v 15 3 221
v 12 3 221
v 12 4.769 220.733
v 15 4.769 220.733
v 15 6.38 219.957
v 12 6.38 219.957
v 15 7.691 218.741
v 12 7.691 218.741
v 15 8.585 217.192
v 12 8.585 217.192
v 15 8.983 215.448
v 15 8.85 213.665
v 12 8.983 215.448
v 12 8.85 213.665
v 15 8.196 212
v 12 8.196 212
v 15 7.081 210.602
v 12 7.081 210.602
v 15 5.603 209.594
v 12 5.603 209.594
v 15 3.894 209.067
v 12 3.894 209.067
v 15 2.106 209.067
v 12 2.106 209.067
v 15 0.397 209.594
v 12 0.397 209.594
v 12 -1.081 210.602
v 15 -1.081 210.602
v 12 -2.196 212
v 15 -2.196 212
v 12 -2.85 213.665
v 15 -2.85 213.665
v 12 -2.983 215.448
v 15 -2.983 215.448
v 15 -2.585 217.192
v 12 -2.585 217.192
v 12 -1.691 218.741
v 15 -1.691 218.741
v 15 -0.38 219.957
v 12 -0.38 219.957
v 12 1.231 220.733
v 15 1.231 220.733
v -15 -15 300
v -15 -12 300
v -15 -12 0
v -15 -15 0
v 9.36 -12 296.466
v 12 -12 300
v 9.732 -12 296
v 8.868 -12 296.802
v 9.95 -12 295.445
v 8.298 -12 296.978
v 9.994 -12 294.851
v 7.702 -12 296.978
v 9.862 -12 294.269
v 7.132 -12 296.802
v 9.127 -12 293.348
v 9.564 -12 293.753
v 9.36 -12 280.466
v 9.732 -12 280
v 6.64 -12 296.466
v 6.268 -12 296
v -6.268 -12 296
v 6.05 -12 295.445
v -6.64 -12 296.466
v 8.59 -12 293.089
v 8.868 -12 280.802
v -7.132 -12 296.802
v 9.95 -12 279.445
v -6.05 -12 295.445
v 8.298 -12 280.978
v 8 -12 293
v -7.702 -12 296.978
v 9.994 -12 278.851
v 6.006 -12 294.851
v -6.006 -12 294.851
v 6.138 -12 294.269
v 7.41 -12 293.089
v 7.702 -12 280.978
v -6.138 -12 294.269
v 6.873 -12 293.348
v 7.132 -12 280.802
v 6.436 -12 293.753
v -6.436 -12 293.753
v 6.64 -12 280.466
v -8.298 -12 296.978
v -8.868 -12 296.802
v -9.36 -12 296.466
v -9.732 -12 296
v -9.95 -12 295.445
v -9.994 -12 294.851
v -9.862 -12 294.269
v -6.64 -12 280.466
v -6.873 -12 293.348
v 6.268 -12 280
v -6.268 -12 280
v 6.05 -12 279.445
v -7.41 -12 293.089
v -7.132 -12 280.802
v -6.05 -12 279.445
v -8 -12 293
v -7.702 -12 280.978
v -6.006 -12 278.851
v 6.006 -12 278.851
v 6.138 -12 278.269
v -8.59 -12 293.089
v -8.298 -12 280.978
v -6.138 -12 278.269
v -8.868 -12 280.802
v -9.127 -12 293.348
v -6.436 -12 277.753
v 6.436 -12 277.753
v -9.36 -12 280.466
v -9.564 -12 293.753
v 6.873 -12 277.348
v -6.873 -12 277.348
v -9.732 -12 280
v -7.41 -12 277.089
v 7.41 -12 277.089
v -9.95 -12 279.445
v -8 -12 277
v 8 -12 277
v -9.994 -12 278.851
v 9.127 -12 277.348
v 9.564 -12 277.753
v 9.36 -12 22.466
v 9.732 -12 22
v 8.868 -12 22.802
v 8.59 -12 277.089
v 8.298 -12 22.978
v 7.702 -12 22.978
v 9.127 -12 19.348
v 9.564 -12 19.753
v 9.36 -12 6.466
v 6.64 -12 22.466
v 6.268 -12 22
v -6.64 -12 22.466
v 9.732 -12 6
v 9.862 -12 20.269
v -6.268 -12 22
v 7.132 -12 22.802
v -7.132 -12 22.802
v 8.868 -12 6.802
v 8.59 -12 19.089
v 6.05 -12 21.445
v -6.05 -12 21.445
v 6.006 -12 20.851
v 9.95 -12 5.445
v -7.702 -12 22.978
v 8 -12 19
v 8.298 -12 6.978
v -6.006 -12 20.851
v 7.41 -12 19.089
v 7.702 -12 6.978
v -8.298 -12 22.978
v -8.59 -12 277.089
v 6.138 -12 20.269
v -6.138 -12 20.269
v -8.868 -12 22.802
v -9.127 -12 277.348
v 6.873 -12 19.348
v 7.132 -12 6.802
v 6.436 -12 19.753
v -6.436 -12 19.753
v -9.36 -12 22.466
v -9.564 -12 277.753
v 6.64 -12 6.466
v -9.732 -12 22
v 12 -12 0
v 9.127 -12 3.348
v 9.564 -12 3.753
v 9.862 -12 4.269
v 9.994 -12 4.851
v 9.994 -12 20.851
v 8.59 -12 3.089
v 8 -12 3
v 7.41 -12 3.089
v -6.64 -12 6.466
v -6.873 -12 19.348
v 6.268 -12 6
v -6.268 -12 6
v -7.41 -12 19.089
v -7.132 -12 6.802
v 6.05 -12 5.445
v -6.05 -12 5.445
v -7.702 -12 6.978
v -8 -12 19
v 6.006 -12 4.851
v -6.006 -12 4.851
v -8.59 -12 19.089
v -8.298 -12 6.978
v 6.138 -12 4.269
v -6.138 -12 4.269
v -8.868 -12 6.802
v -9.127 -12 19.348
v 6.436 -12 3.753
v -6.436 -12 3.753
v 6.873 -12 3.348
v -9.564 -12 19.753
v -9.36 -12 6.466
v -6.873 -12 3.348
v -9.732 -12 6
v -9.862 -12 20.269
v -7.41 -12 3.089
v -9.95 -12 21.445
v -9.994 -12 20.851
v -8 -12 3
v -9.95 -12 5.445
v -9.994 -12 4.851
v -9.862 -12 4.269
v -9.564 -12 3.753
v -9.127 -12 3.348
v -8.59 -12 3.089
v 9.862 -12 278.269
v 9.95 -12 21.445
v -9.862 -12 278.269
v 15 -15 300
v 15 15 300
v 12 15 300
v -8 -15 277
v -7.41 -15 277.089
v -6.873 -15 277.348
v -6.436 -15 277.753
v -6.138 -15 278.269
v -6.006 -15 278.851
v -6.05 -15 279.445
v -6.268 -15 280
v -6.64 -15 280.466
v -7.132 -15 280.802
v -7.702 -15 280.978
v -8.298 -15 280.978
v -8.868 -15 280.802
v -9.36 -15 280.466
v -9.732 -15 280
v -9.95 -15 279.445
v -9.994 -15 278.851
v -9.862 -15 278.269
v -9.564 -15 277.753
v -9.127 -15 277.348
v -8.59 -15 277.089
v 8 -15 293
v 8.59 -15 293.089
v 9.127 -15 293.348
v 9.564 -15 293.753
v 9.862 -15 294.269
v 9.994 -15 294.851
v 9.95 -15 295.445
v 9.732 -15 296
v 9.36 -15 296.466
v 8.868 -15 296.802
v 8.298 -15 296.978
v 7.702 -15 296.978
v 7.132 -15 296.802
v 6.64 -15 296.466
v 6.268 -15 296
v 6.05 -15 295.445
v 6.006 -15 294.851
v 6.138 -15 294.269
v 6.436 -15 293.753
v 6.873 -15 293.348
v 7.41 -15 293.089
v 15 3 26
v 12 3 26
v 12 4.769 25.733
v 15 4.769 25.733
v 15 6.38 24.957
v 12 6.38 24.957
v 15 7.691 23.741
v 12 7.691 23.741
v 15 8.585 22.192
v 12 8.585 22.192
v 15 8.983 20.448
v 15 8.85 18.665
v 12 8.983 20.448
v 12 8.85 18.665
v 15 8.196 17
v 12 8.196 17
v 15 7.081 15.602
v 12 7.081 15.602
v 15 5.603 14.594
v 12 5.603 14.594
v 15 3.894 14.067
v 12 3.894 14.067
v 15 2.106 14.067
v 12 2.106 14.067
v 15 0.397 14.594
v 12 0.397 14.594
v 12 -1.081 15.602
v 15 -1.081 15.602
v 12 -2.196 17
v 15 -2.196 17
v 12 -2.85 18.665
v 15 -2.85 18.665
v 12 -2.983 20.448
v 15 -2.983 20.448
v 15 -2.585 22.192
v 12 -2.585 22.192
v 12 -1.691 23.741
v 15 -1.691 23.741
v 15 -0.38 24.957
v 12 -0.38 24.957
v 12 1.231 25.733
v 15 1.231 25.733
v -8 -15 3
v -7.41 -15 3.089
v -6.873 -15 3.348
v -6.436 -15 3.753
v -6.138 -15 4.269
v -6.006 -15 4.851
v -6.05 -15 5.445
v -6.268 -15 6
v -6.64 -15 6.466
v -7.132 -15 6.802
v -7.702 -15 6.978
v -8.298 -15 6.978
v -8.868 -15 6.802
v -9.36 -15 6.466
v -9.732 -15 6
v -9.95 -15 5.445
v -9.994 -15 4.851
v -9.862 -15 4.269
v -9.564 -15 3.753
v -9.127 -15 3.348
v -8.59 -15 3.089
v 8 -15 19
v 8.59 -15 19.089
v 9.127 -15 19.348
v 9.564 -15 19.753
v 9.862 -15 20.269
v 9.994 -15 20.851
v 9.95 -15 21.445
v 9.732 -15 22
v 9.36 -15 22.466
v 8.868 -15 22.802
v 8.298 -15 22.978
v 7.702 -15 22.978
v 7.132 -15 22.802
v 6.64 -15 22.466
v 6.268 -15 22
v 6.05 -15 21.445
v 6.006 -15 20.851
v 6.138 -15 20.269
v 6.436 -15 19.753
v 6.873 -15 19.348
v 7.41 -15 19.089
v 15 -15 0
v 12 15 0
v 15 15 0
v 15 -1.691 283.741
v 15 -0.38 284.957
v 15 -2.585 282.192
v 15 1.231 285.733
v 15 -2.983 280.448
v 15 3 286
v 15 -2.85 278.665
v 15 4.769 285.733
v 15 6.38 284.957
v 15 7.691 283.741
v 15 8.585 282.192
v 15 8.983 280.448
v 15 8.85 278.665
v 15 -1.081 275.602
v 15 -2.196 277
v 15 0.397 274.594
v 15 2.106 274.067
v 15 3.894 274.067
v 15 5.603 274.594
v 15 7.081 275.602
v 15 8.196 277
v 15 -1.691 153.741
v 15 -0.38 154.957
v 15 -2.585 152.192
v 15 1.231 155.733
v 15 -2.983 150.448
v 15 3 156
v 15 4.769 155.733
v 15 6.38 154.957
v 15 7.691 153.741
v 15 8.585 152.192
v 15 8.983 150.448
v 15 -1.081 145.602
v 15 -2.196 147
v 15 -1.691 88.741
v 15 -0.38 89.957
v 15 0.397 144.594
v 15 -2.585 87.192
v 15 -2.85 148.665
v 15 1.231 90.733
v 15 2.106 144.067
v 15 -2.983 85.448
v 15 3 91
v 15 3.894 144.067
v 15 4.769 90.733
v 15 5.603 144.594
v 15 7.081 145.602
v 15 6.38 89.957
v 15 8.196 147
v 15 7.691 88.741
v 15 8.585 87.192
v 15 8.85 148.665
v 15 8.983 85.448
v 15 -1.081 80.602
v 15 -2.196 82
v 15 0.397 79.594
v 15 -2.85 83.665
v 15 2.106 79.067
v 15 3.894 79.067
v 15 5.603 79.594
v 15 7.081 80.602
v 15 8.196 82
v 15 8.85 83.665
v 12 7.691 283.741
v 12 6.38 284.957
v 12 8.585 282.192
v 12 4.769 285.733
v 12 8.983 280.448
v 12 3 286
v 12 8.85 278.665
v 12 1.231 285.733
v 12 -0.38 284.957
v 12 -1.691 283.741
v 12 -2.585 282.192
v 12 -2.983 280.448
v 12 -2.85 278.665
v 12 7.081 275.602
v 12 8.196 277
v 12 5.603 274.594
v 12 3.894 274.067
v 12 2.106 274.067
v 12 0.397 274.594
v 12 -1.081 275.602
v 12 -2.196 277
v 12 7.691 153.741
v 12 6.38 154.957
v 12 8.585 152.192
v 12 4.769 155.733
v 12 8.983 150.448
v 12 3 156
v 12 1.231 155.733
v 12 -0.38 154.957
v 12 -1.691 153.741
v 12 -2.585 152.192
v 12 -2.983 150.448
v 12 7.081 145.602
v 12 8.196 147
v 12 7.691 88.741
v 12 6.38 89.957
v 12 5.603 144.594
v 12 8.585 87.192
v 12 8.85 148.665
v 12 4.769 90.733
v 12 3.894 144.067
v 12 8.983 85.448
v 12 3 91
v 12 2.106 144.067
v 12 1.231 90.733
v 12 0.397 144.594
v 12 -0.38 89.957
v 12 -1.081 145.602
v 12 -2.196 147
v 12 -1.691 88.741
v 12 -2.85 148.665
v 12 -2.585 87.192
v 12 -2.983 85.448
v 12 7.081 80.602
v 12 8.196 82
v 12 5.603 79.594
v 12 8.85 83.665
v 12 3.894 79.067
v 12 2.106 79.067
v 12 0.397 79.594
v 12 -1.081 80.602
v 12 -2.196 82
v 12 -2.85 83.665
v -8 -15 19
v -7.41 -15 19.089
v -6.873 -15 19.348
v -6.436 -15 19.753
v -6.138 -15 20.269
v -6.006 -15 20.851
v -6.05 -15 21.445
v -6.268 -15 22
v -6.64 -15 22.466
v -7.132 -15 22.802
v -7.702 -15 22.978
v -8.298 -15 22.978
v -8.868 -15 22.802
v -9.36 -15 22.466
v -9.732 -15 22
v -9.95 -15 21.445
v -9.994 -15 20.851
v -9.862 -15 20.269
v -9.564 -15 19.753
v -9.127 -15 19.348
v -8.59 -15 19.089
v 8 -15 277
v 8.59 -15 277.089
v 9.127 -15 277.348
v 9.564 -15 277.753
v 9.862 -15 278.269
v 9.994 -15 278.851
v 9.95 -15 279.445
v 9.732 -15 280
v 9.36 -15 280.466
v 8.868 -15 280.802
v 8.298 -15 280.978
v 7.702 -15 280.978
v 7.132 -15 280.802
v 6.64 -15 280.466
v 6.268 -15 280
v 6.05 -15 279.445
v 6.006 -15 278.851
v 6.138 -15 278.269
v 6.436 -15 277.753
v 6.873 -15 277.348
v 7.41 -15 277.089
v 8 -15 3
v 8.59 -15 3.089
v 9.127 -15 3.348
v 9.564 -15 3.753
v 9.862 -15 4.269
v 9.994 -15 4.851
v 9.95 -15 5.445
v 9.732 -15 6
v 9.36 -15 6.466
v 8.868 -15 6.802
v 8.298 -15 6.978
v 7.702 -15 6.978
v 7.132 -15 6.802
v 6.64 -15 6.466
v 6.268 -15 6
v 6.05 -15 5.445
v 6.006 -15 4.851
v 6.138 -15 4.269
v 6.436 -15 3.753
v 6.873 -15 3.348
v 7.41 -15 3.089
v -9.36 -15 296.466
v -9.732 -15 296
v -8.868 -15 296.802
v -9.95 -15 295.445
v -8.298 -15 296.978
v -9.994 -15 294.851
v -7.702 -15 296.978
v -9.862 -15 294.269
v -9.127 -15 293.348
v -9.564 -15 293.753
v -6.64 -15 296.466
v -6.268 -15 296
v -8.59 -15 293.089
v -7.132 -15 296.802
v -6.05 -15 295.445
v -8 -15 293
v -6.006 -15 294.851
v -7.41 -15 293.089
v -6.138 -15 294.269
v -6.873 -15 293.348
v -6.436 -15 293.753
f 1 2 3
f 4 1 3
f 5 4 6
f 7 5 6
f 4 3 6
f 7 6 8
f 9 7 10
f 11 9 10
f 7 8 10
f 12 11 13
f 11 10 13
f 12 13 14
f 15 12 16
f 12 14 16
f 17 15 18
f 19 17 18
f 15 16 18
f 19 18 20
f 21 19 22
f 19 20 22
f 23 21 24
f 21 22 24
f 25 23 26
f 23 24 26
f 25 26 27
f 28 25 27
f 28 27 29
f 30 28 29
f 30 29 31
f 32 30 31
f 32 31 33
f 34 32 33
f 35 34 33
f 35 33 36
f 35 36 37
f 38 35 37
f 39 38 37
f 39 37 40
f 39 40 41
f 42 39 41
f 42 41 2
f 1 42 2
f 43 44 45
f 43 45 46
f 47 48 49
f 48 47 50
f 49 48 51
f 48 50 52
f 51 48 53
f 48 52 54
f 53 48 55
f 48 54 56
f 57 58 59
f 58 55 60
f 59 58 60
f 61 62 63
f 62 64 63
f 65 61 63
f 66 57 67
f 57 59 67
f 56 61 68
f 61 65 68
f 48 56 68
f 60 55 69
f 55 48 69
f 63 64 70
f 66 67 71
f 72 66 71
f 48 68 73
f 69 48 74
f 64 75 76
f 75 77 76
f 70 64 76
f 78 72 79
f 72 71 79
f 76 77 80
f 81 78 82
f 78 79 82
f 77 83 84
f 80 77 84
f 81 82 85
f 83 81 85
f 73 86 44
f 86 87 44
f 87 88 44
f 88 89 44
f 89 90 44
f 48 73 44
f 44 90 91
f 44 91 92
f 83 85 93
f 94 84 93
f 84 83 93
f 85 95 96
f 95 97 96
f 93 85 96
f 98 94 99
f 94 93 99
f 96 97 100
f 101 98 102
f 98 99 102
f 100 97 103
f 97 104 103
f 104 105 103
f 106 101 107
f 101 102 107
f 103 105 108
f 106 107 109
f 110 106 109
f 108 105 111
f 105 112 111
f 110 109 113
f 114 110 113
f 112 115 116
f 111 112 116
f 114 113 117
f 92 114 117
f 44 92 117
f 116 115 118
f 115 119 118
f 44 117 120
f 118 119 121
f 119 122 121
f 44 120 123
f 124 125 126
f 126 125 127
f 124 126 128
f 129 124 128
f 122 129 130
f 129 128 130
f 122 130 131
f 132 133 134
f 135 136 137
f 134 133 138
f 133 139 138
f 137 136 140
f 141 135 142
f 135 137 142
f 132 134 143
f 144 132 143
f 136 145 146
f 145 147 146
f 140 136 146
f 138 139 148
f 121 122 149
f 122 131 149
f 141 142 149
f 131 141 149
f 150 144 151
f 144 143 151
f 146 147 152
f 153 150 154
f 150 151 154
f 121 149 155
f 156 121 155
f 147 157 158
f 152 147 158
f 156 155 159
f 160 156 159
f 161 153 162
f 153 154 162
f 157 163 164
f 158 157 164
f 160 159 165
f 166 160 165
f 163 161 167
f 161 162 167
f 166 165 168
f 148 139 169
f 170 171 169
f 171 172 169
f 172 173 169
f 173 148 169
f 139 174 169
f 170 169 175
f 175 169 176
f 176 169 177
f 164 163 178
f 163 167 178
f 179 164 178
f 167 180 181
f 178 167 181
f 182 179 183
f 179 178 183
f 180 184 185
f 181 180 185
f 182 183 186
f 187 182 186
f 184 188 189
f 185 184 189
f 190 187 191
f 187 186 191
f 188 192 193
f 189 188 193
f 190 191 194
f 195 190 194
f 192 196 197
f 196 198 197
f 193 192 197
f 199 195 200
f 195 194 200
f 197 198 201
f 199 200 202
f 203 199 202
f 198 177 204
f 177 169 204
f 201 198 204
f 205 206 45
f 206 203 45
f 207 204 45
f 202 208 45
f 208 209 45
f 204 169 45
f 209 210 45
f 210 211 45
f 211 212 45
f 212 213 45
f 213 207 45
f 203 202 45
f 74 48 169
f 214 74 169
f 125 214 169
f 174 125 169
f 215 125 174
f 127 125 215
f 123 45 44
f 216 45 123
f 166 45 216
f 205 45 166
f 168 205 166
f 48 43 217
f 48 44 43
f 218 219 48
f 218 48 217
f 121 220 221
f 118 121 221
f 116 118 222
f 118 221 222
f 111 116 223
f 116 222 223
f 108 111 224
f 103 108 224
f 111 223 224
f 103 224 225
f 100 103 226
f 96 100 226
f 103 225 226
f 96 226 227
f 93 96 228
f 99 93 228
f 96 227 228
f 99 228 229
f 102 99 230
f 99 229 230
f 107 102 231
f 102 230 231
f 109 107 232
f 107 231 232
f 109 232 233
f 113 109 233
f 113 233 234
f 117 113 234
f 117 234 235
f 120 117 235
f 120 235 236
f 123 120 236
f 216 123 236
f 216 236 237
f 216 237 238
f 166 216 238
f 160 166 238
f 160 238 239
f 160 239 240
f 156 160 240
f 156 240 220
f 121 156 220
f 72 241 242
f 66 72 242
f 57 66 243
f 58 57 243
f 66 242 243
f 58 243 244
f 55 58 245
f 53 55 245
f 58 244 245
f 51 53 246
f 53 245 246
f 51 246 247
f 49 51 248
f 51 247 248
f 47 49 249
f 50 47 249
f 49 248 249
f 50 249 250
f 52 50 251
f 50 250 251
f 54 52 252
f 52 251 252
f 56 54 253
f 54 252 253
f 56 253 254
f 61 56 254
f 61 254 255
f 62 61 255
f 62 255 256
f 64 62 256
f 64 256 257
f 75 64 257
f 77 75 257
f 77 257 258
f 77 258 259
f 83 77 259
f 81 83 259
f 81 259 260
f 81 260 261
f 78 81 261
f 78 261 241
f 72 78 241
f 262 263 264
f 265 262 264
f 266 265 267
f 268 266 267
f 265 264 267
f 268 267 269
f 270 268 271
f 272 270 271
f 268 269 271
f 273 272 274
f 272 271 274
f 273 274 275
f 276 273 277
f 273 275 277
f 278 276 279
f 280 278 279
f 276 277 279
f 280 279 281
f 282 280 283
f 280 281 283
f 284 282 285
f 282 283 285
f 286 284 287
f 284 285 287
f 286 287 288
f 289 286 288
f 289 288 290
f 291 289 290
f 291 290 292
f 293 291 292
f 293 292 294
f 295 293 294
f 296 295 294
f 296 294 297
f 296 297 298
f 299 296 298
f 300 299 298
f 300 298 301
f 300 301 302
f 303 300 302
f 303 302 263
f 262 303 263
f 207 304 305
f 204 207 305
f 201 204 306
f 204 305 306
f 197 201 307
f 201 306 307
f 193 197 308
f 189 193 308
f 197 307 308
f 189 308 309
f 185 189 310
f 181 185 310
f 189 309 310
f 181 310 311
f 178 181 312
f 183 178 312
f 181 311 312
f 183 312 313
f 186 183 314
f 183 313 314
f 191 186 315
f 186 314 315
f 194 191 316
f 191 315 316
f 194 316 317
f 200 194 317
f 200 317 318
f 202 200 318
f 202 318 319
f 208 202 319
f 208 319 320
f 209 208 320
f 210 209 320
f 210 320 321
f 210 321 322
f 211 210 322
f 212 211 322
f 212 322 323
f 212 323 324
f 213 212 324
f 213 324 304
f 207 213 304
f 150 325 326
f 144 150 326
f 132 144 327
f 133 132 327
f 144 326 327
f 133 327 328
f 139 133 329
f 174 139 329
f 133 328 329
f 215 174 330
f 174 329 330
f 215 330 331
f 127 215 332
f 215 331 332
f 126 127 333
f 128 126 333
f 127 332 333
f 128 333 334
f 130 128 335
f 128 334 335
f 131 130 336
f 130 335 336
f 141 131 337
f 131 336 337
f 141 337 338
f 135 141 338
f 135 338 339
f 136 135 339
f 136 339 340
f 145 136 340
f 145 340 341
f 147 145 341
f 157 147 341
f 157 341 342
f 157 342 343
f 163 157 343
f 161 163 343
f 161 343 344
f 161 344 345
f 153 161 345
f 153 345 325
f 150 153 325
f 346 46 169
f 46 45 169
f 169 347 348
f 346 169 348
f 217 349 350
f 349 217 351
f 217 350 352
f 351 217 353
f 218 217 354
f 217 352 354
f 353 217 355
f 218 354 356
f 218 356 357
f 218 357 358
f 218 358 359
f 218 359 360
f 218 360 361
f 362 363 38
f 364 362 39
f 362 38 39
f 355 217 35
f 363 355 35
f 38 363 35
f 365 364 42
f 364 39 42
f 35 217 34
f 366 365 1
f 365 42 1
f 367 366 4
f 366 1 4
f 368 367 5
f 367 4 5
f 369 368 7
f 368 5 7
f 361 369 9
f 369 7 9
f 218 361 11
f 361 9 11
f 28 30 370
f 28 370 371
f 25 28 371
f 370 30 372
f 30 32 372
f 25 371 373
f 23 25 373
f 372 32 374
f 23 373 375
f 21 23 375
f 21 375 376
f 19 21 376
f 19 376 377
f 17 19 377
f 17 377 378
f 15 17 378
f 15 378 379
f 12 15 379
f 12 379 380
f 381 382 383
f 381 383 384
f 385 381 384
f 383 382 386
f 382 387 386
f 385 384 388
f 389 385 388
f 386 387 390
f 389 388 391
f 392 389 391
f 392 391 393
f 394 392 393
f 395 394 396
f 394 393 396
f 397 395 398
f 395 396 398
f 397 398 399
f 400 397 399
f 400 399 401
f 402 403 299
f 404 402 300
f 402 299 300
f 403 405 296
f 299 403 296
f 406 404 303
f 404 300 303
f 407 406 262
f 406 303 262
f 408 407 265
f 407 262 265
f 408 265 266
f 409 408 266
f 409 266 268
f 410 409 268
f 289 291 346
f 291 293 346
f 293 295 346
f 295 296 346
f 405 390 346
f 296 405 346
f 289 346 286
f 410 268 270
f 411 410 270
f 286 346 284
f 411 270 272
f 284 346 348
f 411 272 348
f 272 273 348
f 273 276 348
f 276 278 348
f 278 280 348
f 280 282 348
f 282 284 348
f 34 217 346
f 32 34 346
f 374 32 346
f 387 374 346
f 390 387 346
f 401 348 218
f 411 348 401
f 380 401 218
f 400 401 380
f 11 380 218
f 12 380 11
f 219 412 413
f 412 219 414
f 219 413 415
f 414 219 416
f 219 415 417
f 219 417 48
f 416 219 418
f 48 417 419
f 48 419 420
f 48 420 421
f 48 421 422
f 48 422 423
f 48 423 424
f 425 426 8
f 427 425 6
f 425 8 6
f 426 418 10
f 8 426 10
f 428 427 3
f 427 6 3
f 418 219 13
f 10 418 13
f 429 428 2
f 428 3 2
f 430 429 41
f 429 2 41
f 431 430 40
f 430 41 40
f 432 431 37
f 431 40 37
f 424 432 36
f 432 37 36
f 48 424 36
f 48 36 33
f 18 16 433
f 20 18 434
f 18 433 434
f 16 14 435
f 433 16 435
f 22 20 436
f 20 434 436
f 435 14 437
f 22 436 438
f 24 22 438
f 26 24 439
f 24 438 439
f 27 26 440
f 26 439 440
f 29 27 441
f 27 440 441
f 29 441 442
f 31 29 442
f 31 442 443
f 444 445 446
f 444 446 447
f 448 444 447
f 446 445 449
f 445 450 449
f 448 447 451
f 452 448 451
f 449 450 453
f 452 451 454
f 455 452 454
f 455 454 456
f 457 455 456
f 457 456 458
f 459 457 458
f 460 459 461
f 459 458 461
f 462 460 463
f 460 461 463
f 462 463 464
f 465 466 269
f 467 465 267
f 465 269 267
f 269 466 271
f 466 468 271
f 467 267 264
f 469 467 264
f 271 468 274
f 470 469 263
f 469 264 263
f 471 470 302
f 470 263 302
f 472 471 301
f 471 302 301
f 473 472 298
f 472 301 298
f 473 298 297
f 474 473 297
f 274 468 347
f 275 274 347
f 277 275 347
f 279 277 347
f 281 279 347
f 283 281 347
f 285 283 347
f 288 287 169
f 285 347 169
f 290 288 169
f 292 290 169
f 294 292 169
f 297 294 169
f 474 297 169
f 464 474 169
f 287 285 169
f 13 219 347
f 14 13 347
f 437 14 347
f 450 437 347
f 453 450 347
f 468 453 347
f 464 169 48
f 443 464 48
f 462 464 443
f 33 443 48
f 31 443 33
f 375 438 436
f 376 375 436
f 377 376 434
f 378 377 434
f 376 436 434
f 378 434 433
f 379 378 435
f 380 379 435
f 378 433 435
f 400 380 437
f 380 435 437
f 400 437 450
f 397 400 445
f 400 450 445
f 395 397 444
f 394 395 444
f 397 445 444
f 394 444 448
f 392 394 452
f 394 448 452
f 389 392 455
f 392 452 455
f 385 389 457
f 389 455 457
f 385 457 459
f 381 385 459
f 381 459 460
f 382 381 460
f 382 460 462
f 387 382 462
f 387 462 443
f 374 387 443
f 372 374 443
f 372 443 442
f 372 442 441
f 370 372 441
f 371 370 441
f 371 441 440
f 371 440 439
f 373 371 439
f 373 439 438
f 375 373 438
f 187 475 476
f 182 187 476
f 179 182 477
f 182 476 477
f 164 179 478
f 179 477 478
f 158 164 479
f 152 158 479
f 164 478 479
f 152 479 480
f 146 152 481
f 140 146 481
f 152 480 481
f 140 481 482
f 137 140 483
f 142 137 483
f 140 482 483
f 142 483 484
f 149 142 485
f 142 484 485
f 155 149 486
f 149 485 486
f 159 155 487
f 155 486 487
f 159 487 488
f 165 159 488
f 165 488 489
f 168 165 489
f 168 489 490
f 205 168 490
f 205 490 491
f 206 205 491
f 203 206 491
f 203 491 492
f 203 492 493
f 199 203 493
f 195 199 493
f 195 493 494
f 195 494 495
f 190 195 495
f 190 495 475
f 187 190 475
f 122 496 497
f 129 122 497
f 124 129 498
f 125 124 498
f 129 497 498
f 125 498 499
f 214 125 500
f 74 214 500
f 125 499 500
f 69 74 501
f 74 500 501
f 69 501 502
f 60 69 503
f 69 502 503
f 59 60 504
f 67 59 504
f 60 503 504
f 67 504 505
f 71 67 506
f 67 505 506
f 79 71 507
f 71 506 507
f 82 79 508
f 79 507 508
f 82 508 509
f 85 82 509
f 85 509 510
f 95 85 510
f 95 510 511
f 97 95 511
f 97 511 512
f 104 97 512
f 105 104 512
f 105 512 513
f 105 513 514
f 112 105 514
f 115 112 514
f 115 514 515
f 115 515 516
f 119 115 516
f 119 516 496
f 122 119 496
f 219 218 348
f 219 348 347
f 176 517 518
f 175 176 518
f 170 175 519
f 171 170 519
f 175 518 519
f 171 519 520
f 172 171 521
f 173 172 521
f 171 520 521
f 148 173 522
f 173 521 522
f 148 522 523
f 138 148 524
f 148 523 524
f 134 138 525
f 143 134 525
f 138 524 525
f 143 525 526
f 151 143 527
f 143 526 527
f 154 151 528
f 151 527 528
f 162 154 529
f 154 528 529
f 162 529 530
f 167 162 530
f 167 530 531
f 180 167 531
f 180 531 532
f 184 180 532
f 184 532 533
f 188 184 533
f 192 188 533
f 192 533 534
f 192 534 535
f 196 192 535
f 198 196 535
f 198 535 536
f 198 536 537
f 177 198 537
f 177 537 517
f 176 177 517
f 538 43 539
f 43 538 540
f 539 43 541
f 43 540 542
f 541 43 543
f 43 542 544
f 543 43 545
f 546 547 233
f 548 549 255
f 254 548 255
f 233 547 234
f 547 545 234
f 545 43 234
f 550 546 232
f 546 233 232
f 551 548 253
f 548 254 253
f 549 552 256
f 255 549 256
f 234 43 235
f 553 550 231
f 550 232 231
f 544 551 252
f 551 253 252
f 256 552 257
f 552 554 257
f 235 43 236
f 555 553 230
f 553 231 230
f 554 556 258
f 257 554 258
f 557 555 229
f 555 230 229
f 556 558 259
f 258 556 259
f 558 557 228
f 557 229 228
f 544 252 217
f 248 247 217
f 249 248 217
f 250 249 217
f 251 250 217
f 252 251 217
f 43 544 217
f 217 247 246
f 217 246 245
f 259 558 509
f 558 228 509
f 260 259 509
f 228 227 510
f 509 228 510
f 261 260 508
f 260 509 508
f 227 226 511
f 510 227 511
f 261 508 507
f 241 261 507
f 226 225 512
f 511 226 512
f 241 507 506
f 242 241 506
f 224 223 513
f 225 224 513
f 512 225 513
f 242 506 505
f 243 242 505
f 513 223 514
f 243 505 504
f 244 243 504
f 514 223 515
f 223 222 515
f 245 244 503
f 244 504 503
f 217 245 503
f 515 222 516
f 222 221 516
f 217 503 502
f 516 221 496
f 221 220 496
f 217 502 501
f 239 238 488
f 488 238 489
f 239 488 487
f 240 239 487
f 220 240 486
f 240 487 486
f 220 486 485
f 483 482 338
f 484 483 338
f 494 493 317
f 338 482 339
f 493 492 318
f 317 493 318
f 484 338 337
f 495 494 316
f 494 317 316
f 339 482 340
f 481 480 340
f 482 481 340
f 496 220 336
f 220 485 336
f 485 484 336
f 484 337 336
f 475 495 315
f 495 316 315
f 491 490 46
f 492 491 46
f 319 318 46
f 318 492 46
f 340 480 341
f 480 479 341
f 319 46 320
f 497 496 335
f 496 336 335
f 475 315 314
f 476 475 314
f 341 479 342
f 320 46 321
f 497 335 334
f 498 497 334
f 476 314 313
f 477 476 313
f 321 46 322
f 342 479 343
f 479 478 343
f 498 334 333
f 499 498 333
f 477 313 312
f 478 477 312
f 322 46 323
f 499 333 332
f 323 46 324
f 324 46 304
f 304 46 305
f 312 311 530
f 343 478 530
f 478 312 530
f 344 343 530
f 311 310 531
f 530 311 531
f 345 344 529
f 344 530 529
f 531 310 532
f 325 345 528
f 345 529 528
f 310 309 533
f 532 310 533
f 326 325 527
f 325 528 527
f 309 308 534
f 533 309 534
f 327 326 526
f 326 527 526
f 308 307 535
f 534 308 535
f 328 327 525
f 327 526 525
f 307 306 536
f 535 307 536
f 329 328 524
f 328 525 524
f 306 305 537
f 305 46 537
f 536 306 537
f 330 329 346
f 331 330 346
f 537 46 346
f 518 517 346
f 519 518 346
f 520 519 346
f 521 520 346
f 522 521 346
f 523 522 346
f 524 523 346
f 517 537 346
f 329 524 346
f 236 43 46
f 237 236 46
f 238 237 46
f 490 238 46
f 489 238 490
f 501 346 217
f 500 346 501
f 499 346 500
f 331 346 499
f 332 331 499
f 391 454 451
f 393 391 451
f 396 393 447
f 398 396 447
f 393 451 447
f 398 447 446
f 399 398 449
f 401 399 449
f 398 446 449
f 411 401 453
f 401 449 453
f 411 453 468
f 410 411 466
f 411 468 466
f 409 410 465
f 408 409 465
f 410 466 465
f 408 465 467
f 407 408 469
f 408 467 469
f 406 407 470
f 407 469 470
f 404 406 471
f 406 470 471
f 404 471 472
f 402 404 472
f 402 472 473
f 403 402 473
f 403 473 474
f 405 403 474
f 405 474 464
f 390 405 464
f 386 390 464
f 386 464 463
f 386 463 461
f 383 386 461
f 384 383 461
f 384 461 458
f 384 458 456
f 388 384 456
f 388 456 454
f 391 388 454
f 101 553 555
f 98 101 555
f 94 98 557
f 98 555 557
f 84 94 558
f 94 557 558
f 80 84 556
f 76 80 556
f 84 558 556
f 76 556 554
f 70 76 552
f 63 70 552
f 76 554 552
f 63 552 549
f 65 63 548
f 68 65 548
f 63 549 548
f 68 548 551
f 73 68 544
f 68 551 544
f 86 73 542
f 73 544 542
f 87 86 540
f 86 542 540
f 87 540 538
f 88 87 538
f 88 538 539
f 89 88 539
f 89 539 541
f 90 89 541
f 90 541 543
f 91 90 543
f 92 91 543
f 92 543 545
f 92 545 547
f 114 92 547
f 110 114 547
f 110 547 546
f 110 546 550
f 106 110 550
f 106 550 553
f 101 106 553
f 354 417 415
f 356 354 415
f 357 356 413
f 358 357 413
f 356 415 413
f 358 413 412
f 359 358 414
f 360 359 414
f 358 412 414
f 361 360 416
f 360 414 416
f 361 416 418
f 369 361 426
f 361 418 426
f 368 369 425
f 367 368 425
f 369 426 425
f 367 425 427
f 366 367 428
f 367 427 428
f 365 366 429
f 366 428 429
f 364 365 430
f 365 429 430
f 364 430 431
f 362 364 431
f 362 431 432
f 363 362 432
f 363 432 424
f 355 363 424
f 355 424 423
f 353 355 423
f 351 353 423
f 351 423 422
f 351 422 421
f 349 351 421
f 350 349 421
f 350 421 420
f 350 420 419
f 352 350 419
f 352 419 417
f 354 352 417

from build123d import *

# Parameters (mm, degrees)
EXTRUDE_1_DEPTH     = 300
SKETCH_2_R          = 6
CUT_EXTRUDE_1_DEPTH = 300
SKETCH_3_R          = 2
CUT_EXTRUDE_2_DEPTH = 300


with BuildPart() as part:
    # 草图1 → 凸台-拉伸1 (new body)
    with BuildSketch(Plane.XY):
        Polygon((-15, -15), (15, -15), (15, 15), (12, 15), (12, -12), (-15, -12), align=None)
    extrude(amount=EXTRUDE_1_DEPTH)

    # 草图2 → 切除-拉伸1 (cut)
    with BuildSketch(Plane.ZY.offset(-12)):
        with Locations((20, 3)):
            Circle(SKETCH_2_R)
        with Locations((85, 3)):
            Circle(SKETCH_2_R)
        with Locations((150, 3)):
            Circle(SKETCH_2_R)
        with Locations((215, 3)):
            Circle(SKETCH_2_R)
        with Locations((280, 3)):
            Circle(SKETCH_2_R)
    extrude(amount=-CUT_EXTRUDE_1_DEPTH, mode=Mode.SUBTRACT)

    # 草图3 → 切除-拉伸2 (cut)
    with BuildSketch(Plane.XZ.offset(15)):
        with Locations(Location((-8, 295, 0), (0, 0, 270))):
            Circle(SKETCH_3_R)
        with Locations(Location((-8, 279, 0), (0, 0, 270))):
            Circle(SKETCH_3_R)
        with Locations(Location((8, 279, 0), (0, 0, 270))):
            Circle(SKETCH_3_R)
        with Locations(Location((8, 295, 0), (0, 0, 270))):
            Circle(SKETCH_3_R)
        with Locations(Location((-8, 21, 0), (0, 0, 270))):
            Circle(SKETCH_3_R)
        with Locations(Location((-8, 5, 0), (0, 0, 270))):
            Circle(SKETCH_3_R)
        with Locations(Location((8, 5, 0), (0, 0, 270))):
            Circle(SKETCH_3_R)
        with Locations(Location((8, 21, 0), (0, 0, 270))):
            Circle(SKETCH_3_R)
    extrude(amount=-CUT_EXTRUDE_2_DEPTH, mode=Mode.SUBTRACT)


solid = part.part
